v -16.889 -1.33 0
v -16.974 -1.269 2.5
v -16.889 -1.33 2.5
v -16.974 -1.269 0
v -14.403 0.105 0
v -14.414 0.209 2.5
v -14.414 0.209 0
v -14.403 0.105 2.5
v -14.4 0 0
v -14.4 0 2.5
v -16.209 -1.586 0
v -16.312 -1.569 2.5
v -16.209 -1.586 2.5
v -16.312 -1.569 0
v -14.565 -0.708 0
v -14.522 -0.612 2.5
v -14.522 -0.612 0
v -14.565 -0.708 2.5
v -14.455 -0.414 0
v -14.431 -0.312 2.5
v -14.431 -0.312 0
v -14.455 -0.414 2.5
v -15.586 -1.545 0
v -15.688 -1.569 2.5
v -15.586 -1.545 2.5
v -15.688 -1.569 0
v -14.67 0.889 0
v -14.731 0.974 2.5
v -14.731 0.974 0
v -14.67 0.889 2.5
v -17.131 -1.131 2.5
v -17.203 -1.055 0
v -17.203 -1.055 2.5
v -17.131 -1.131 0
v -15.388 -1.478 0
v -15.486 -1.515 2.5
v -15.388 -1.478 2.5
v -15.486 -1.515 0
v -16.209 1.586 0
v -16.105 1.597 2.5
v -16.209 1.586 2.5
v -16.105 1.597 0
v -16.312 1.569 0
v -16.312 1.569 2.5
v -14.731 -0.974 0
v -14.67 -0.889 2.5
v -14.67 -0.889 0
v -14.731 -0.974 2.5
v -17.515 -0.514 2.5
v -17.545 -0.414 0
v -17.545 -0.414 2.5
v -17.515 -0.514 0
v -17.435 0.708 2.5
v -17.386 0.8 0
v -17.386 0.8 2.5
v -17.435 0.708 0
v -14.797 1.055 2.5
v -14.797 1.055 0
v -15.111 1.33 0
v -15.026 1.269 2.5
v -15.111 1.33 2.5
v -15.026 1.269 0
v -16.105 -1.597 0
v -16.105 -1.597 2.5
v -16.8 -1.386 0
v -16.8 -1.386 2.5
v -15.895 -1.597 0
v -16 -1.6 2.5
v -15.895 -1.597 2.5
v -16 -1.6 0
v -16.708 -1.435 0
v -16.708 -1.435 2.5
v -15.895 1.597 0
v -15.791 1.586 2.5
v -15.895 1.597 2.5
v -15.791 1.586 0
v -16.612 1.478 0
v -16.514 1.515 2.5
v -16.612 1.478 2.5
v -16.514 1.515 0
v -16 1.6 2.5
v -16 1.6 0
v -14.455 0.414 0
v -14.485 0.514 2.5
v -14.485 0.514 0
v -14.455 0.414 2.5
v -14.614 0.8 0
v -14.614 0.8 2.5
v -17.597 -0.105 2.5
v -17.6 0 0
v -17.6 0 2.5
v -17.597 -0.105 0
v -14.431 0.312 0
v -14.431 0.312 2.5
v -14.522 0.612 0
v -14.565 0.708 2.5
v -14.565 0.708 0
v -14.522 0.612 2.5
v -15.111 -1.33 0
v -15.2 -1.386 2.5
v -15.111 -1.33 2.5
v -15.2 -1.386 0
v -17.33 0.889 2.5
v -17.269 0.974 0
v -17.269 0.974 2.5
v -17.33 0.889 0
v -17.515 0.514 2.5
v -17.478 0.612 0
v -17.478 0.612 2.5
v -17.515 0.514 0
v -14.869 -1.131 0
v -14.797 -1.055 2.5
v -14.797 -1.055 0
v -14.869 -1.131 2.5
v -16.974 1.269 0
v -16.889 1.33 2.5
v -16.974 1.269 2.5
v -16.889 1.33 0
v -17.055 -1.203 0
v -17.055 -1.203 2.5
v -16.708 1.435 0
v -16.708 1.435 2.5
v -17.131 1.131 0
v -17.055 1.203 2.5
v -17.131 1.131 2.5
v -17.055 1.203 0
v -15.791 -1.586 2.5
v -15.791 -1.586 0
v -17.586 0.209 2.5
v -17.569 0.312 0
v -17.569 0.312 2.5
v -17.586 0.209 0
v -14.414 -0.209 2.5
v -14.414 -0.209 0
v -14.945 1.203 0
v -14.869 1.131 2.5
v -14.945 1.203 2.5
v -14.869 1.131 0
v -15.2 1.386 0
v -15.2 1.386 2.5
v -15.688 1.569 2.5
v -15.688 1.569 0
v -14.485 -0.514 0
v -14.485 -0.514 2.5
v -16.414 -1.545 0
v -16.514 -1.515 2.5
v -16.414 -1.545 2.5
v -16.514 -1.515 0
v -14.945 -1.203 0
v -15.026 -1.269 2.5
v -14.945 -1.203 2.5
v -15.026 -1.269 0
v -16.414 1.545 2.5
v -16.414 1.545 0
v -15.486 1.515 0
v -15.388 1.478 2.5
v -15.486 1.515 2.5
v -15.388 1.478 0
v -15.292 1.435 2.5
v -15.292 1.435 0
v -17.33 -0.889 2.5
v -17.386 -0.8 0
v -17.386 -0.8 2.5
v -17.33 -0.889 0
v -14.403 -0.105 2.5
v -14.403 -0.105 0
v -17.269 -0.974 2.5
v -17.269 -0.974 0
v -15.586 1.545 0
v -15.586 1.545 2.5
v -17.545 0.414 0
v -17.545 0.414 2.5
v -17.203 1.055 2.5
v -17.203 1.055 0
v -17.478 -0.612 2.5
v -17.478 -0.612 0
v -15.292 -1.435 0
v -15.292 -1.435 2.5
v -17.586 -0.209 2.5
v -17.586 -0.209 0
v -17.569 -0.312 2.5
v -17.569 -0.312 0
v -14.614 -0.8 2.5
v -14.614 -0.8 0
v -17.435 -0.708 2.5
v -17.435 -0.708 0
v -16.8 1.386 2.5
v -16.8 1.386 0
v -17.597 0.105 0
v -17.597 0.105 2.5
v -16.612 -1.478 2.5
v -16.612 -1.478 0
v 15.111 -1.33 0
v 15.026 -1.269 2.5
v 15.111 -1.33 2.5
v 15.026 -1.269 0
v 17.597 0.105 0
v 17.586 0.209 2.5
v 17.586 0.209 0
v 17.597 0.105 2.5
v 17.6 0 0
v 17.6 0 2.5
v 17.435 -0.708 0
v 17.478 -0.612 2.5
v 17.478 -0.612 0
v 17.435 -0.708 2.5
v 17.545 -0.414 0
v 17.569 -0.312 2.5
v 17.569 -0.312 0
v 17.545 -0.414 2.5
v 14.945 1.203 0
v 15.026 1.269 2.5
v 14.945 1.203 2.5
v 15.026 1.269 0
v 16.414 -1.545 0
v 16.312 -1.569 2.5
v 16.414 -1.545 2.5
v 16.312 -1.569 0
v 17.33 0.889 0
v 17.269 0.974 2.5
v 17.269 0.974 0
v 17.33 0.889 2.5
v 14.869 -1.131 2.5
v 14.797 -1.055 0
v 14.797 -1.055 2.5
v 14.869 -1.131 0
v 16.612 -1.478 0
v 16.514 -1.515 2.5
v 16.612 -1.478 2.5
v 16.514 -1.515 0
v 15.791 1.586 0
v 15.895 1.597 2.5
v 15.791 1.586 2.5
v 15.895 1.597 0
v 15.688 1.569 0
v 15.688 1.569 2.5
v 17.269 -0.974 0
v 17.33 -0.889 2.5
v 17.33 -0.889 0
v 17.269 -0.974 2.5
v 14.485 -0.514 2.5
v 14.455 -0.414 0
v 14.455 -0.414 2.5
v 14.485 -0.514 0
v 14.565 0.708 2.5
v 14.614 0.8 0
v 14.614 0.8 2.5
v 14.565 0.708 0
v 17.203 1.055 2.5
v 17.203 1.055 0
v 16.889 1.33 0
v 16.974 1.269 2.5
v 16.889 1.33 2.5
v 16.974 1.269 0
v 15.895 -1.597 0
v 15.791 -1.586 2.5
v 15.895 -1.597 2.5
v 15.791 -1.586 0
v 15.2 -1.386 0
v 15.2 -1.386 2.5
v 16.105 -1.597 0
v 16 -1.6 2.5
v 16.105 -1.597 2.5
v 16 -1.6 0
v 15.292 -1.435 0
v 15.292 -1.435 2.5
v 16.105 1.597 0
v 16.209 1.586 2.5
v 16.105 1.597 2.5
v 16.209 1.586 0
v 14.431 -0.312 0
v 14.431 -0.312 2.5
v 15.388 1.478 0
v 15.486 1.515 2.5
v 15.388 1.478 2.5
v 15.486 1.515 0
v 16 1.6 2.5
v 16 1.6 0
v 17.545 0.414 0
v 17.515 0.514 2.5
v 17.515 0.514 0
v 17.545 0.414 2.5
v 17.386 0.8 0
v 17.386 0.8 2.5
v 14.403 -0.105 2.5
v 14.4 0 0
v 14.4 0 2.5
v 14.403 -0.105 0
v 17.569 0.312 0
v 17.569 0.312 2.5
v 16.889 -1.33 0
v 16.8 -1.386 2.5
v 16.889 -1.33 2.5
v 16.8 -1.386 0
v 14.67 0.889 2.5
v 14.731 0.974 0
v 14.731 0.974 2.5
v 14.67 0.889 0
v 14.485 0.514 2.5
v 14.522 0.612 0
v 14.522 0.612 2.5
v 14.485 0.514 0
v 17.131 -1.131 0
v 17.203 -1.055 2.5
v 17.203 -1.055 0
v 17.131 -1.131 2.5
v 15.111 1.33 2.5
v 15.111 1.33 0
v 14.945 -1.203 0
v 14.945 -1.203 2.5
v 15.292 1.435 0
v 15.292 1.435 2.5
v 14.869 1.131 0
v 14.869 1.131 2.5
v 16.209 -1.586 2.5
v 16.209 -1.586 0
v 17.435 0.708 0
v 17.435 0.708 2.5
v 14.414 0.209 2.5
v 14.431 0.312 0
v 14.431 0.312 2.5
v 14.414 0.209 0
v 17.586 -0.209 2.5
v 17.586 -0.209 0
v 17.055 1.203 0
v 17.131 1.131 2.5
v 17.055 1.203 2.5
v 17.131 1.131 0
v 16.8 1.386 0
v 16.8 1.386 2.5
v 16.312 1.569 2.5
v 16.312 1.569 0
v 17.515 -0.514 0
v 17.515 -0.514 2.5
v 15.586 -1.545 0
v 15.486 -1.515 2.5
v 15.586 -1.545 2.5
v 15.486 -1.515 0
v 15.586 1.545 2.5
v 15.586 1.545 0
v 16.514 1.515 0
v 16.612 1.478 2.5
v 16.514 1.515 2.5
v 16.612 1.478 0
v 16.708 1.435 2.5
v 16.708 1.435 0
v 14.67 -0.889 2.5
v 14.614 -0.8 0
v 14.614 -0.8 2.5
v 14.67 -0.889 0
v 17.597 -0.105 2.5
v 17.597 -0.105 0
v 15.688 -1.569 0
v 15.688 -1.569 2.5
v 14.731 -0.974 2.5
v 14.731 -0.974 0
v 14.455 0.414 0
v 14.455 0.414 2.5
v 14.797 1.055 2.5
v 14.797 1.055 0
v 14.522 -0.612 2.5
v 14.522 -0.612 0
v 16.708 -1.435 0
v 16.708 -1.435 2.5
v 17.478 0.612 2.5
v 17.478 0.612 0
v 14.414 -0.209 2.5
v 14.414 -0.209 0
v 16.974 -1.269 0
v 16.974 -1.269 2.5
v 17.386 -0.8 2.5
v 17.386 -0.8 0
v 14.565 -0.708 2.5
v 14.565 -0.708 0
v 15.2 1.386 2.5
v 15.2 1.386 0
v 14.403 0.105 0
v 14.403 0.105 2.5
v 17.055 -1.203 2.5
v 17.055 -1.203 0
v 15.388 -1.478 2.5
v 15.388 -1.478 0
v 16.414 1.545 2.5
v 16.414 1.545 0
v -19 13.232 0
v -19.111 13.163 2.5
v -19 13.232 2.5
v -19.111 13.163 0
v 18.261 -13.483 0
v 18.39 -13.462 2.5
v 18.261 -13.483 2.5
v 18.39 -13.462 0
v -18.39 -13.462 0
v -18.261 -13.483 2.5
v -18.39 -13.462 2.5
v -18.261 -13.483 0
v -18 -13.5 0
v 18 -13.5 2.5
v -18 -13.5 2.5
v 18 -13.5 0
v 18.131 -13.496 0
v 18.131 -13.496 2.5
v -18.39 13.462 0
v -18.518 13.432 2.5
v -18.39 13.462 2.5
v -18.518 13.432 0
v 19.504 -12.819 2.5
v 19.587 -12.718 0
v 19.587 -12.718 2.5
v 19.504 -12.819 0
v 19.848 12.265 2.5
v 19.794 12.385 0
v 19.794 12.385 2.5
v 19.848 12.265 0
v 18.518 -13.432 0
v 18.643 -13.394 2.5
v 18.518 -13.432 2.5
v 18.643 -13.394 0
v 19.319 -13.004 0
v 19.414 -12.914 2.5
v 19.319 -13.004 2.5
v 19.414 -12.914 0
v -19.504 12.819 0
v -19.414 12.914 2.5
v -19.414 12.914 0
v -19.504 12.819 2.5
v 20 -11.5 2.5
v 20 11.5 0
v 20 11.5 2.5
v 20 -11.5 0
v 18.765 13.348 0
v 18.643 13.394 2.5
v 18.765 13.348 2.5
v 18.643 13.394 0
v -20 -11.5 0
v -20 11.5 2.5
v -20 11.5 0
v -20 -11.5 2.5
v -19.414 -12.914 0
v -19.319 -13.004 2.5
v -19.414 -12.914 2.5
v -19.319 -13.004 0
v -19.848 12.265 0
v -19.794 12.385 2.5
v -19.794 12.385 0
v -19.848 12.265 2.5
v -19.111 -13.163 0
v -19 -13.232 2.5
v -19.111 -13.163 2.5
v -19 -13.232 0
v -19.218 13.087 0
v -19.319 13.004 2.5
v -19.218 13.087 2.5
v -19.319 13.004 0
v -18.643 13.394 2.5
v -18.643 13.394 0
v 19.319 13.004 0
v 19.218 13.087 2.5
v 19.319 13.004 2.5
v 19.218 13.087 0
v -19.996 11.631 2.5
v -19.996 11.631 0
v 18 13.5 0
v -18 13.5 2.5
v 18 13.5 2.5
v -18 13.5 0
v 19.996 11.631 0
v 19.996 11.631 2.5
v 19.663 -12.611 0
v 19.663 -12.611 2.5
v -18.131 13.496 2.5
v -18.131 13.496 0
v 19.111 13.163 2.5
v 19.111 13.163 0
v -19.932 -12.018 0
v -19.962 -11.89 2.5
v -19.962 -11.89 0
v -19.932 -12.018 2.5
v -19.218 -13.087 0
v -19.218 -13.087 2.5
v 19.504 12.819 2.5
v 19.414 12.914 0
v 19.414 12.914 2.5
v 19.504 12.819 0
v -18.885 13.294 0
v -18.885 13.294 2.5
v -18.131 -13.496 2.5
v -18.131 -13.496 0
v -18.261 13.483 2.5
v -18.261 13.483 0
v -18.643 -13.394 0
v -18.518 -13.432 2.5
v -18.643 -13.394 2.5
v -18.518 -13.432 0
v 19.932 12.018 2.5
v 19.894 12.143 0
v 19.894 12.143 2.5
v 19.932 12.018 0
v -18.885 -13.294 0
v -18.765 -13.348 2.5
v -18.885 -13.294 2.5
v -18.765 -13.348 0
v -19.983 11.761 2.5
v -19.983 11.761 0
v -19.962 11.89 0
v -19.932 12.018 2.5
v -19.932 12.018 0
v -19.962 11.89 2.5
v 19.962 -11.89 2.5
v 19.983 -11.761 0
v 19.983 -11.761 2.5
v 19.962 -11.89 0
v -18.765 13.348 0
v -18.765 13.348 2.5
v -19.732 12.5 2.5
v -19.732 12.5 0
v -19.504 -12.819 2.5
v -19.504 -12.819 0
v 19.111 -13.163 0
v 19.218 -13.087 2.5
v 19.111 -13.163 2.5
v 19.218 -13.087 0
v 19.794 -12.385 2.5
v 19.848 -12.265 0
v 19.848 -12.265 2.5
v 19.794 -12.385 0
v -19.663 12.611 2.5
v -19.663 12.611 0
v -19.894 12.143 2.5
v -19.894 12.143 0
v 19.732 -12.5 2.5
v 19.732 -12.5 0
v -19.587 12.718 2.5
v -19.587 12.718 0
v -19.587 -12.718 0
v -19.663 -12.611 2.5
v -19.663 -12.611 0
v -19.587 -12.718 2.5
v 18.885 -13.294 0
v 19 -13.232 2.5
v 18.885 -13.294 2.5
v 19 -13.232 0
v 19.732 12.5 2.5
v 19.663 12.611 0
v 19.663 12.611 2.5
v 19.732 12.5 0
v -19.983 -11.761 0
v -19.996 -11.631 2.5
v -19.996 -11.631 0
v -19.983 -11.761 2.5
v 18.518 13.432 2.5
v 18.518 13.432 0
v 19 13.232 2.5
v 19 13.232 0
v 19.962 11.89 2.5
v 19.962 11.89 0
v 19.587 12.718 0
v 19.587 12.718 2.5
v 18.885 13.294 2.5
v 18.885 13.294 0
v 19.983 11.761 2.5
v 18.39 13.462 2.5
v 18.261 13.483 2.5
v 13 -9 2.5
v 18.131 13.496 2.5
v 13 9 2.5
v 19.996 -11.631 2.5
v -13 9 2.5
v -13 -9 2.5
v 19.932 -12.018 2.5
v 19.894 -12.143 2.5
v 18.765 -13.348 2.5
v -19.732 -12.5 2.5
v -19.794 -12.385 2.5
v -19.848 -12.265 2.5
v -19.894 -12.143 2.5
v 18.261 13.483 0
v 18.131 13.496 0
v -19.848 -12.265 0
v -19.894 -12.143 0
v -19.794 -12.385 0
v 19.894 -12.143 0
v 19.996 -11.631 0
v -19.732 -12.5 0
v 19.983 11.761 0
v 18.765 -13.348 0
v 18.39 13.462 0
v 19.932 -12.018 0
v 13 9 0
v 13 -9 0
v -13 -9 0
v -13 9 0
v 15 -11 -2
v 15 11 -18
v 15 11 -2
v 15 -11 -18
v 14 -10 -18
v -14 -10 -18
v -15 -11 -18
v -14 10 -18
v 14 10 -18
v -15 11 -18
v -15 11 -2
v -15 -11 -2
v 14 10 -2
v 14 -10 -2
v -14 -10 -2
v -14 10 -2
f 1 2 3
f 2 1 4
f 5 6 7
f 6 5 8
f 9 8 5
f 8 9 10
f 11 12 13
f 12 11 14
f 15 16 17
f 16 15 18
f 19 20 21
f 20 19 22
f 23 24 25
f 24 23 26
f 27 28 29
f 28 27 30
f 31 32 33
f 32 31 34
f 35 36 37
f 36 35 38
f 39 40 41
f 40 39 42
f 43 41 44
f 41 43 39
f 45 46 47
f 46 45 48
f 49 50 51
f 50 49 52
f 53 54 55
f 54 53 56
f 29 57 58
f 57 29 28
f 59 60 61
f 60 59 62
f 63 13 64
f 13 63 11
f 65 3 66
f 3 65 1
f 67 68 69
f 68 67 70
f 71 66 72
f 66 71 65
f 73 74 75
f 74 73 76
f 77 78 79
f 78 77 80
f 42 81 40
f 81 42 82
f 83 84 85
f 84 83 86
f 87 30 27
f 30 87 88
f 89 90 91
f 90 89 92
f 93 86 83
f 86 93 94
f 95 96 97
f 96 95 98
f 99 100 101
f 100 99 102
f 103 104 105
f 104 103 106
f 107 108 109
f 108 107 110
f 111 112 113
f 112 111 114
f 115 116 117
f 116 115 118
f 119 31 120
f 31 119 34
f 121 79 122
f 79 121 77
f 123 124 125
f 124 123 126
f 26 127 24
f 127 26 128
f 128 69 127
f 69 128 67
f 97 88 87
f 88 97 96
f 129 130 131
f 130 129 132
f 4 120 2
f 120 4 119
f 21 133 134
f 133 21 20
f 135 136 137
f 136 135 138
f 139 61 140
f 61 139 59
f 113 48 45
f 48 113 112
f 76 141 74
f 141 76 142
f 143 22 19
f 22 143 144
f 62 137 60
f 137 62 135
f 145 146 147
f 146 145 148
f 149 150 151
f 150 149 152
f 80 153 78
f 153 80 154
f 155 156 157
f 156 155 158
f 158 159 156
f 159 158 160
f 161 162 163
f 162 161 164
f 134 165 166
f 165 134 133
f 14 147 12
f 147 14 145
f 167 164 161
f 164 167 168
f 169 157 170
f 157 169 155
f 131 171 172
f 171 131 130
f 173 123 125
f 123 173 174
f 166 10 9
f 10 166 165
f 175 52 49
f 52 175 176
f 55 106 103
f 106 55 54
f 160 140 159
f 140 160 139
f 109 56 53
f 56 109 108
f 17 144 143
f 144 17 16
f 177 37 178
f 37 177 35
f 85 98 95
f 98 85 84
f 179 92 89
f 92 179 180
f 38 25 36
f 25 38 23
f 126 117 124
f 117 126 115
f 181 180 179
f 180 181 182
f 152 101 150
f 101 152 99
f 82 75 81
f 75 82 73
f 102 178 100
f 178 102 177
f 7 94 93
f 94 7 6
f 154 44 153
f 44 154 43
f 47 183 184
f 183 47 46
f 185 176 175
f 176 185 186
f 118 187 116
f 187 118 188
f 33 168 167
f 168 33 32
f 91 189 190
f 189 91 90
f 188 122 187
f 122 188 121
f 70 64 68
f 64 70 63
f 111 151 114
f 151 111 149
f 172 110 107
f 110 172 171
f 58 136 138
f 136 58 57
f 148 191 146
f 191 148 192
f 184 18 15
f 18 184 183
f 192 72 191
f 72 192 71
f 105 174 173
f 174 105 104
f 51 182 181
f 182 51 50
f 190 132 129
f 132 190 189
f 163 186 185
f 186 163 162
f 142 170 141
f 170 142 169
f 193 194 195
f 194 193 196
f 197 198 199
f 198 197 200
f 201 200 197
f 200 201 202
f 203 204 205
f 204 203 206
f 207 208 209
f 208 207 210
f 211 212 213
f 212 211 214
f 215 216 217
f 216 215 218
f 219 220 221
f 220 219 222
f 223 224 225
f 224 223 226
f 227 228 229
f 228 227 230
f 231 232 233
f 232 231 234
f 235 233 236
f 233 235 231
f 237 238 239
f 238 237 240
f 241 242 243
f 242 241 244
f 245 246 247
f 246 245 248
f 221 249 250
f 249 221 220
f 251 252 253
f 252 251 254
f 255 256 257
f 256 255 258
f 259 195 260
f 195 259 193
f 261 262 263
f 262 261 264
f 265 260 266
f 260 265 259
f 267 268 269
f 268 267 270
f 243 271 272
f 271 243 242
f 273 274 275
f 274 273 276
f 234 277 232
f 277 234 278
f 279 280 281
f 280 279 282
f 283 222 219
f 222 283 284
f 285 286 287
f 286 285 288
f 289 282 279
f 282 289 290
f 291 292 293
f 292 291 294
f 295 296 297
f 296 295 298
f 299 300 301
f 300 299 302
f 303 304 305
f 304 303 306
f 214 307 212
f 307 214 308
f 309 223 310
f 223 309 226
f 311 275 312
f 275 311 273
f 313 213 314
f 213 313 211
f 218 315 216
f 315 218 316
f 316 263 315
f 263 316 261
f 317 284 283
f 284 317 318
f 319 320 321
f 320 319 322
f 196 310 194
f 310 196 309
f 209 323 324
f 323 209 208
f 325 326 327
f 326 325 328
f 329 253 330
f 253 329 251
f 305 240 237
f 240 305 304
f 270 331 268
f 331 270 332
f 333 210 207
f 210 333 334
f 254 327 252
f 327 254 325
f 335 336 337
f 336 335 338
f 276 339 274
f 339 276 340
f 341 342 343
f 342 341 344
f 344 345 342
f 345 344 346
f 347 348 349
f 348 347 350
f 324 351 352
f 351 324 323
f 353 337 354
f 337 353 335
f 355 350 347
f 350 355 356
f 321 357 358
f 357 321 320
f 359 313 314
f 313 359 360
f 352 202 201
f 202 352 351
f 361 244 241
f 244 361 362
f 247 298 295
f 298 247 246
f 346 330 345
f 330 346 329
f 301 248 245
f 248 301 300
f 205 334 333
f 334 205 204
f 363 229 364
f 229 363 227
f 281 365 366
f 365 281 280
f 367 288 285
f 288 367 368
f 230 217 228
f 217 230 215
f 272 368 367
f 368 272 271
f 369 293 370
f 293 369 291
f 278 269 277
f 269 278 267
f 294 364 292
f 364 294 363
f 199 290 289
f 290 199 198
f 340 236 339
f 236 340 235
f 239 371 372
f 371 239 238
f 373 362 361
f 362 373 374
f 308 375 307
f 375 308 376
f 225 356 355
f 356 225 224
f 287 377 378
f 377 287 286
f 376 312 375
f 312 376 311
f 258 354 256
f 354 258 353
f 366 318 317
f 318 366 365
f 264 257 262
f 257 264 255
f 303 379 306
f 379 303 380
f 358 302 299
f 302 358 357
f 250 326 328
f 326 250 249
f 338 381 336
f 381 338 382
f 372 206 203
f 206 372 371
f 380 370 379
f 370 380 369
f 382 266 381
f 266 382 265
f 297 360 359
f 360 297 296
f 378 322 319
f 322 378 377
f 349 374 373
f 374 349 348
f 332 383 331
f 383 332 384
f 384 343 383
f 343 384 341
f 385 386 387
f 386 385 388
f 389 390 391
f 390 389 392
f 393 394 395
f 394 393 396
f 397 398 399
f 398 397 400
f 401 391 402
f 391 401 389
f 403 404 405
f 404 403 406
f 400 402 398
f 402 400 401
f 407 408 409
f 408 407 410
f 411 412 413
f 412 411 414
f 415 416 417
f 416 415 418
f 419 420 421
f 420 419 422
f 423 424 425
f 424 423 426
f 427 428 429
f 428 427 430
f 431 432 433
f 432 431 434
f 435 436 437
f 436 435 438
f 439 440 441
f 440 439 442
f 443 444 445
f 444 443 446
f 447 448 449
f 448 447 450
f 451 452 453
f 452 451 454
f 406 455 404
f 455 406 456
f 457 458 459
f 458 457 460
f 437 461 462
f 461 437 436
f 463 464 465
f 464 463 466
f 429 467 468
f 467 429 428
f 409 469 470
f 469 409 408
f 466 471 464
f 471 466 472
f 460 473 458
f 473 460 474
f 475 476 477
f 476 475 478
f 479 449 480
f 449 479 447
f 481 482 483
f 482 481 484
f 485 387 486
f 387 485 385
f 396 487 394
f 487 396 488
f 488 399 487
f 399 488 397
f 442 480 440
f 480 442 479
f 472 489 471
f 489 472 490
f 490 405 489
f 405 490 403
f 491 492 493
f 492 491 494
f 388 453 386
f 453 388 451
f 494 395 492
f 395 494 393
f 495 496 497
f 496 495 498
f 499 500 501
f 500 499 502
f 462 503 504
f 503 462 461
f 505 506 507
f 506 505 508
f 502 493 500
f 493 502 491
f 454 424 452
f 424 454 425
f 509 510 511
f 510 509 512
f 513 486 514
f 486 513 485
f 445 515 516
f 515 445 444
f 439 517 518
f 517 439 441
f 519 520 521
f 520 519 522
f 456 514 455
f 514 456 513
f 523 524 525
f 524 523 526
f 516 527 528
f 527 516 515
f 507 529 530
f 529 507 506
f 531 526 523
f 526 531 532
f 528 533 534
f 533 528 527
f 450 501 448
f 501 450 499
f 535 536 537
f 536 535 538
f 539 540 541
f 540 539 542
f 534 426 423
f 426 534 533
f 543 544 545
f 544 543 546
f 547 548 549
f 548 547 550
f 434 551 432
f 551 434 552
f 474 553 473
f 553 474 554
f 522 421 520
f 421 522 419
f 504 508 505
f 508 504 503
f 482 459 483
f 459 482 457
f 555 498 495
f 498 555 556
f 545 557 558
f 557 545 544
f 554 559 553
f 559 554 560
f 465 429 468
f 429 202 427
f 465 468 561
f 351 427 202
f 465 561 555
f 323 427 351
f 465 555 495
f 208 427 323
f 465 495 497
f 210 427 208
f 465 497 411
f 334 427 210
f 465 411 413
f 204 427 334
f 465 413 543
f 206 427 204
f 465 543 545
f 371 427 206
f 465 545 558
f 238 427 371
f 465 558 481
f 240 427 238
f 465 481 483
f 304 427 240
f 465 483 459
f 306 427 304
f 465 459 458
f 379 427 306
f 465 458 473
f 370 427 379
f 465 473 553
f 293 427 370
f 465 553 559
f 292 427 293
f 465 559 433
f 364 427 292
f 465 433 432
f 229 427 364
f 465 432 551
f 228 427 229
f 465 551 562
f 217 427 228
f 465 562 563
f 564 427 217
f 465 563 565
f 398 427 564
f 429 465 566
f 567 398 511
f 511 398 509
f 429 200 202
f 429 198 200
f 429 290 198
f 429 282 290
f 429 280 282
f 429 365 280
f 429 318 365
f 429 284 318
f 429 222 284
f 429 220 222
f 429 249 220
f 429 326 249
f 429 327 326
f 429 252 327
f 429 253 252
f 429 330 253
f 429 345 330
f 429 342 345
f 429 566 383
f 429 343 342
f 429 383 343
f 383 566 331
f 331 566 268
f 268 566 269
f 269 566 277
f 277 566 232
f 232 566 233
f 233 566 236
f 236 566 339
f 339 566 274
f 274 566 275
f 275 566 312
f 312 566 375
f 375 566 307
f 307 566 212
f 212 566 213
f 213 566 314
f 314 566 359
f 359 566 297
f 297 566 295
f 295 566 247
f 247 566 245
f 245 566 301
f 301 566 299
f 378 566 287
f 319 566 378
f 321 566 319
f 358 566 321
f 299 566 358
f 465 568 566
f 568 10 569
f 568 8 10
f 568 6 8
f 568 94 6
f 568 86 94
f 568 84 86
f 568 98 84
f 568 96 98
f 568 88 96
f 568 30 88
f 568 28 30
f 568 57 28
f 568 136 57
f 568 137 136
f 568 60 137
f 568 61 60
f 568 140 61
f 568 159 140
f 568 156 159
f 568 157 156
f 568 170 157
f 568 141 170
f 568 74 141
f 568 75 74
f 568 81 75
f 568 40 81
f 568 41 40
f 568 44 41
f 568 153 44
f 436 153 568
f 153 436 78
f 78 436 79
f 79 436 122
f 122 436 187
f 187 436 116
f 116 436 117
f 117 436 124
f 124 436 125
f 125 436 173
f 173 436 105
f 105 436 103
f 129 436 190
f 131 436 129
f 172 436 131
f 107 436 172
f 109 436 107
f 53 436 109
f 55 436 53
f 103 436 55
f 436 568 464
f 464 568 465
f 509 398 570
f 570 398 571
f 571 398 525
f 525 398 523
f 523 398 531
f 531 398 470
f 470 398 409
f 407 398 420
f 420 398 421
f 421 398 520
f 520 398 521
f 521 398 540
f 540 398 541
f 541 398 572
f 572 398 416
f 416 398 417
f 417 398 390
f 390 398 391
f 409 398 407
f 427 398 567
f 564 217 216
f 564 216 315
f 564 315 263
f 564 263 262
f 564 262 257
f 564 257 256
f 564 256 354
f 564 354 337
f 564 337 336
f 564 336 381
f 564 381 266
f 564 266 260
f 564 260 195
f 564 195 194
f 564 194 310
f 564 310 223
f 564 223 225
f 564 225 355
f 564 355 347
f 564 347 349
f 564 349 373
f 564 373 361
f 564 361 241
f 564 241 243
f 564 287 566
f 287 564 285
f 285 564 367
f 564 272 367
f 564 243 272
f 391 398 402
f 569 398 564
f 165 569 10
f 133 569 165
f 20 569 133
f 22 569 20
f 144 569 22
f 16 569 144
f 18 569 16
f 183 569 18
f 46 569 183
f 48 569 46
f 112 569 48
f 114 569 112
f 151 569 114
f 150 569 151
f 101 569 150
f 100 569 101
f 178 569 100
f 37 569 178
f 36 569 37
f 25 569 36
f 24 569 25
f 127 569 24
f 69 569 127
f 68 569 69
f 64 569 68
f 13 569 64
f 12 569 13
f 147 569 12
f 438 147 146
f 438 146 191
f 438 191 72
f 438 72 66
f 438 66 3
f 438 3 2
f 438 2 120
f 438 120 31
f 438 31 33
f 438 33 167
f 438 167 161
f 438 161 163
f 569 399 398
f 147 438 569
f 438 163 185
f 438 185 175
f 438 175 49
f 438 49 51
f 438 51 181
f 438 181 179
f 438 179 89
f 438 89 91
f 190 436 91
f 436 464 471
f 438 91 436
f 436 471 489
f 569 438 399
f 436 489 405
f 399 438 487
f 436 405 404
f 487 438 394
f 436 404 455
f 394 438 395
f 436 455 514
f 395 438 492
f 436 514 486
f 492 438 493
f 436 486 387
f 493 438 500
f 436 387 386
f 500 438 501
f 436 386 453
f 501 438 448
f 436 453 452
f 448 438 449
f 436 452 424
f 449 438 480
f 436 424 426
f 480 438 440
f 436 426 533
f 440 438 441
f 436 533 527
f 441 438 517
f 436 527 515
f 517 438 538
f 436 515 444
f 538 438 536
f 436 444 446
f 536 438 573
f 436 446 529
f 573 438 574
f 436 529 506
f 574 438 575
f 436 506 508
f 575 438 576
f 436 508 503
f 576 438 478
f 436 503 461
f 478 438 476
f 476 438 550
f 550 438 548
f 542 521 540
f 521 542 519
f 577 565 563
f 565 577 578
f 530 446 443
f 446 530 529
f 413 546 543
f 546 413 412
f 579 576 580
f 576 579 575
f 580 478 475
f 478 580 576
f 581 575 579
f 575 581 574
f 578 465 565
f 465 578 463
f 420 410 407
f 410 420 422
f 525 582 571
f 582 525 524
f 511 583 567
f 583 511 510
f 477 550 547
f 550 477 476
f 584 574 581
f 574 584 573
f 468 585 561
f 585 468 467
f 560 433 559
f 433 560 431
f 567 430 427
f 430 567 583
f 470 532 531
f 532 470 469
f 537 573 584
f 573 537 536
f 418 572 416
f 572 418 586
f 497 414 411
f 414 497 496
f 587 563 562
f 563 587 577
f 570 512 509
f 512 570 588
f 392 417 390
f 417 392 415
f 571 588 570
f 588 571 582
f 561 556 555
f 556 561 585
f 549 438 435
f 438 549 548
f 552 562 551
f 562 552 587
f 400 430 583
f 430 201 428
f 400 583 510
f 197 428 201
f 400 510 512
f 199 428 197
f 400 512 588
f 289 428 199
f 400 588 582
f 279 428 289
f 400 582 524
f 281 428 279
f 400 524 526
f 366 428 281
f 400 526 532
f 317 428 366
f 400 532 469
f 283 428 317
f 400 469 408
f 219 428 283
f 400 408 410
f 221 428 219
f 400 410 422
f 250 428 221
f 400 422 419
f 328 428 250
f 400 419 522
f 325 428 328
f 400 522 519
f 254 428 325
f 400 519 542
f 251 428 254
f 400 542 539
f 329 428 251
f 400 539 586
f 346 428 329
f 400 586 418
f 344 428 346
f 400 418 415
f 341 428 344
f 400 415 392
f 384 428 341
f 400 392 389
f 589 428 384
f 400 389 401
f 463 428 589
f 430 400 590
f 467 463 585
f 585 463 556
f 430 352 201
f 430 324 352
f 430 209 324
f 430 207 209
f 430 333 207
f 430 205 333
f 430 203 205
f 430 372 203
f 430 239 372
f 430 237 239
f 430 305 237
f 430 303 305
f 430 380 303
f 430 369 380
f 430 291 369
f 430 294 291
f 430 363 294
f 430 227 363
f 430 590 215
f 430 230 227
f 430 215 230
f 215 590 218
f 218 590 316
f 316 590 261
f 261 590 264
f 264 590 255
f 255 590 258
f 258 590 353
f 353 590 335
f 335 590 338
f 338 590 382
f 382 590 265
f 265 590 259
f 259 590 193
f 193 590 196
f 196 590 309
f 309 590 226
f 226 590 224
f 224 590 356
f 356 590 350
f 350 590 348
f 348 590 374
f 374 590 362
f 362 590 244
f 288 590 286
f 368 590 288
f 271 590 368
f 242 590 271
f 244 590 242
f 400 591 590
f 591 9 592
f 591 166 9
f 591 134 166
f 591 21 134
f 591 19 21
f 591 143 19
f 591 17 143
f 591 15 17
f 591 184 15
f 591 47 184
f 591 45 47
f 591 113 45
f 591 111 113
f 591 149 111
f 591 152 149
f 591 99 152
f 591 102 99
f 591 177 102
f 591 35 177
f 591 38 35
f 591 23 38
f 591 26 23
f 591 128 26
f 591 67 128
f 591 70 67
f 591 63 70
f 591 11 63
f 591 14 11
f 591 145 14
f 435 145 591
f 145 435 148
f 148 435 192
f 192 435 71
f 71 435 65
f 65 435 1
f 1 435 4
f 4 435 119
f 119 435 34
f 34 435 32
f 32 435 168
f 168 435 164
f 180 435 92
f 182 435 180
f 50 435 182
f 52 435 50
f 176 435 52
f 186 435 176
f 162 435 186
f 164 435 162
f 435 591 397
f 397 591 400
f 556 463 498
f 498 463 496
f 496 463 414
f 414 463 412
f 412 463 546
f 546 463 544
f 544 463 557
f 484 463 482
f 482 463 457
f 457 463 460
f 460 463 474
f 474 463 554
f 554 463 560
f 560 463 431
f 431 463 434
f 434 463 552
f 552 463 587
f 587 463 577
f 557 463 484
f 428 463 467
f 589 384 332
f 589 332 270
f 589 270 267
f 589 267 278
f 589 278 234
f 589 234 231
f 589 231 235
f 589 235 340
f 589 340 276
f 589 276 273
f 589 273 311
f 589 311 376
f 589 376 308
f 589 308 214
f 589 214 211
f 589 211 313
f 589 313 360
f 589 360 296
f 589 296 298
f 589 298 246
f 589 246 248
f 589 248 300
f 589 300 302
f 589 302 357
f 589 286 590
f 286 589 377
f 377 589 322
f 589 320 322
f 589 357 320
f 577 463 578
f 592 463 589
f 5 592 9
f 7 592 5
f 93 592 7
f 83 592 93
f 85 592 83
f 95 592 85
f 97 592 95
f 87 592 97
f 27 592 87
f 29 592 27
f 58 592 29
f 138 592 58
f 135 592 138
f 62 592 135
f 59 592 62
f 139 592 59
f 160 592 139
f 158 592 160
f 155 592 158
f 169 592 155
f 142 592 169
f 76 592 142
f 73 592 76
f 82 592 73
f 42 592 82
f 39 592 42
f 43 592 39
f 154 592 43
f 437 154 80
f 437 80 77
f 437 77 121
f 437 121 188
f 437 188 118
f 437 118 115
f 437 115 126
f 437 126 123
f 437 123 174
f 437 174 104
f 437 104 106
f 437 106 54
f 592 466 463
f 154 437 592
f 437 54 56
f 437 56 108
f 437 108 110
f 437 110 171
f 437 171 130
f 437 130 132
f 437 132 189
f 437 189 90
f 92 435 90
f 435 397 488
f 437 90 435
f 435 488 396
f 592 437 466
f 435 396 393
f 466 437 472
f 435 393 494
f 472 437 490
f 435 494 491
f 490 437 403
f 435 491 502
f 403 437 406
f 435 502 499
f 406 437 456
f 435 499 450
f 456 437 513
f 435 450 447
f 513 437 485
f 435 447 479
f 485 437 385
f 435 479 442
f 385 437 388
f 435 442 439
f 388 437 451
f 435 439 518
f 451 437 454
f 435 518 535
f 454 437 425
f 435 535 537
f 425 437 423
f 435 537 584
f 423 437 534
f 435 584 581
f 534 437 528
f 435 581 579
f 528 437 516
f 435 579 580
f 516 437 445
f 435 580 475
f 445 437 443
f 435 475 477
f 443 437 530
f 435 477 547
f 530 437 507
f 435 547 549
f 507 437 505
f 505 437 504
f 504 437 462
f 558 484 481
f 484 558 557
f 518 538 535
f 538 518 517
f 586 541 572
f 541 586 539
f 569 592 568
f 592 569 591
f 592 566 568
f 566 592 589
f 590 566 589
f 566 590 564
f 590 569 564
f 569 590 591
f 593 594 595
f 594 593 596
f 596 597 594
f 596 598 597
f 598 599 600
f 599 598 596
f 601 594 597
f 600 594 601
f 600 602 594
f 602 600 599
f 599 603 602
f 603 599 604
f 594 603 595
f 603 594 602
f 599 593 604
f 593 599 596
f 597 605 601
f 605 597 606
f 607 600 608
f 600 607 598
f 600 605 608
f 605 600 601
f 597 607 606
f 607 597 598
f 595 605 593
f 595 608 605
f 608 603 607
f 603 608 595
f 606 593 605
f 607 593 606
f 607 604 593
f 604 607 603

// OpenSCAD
$fn=96;

// IEC C14 (ATX-style) inlet module outline (approximate) for panel cutout / mockup
// Overall faceplate: 40 x 27 mm
// Body: recessed behind faceplate
// Flange holes: 2x M3 clearance (3.2mm) typical, centered vertically
// NOTE: Dimensions are approximate; adjust to your specific inlet datasheet.

module iec_inlet_module(
    face_w=40.0,
    face_h=27.0,
    face_t=2.5,

    body_w=30.0,
    body_h=22.0,
    body_d=18.0,

    // Panel cutout (typical IEC C14 snap-in style is ~27.5 x 20.0,
    // but flanged screw-mount modules vary; keep as a reasonable ATX-ish cutout)
    cutout_w=28.0,
    cutout_h=20.0,

    // Screw holes on flange
    hole_d=3.2,
    hole_x=16.0,   // half spacing from center (i.e., spacing = 32mm)
    hole_y=0.0,    // centered vertically

    // Cosmetic inlet opening on front
    inlet_w=26.0,
    inlet_h=18.0,
    inlet_depth=6.0,

    // Corner rounding for faceplate
    face_r=2.0
){
    difference() {
        // Faceplate with rounded corners
        linear_extrude(height=face_t)
            offset(r=face_r)
                square([face_w-2*face_r, face_h-2*face_r], center=true);

        // Screw holes through faceplate
        for (sx=[-1,1]) {
            translate([sx*hole_x, hole_y, -0.1])
                cylinder(d=hole_d, h=face_t+0.2);
        }

        // Front inlet opening (cosmetic recess)
        translate([0,0, -0.1])
            linear_extrude(height=inlet_depth+0.2)
                square([inlet_w, inlet_h], center=true);
    }

    // Rear body (the part that goes through the panel)
    // Positioned behind the faceplate
    translate([0,0, -body_d])
        difference() {
            // Main body block
            translate([0,0, body_d/2])
                cube([body_w, body_h, body_d], center=true);

            // Through cutout void (panel cutout / internal clearance)
            translate([0,0, body_d/2])
                cube([cutout_w, cutout_h, body_d+0.5], center=true);

            // Slight lead-in chamfer-ish relief at front of body
            translate([0,0, body_d-2])
                linear_extrude(height=2.5)
                    offset(delta=1.0)
                        square([cutout_w, cutout_h], center=true);
        }
}

// Render
iec_inlet_module();
